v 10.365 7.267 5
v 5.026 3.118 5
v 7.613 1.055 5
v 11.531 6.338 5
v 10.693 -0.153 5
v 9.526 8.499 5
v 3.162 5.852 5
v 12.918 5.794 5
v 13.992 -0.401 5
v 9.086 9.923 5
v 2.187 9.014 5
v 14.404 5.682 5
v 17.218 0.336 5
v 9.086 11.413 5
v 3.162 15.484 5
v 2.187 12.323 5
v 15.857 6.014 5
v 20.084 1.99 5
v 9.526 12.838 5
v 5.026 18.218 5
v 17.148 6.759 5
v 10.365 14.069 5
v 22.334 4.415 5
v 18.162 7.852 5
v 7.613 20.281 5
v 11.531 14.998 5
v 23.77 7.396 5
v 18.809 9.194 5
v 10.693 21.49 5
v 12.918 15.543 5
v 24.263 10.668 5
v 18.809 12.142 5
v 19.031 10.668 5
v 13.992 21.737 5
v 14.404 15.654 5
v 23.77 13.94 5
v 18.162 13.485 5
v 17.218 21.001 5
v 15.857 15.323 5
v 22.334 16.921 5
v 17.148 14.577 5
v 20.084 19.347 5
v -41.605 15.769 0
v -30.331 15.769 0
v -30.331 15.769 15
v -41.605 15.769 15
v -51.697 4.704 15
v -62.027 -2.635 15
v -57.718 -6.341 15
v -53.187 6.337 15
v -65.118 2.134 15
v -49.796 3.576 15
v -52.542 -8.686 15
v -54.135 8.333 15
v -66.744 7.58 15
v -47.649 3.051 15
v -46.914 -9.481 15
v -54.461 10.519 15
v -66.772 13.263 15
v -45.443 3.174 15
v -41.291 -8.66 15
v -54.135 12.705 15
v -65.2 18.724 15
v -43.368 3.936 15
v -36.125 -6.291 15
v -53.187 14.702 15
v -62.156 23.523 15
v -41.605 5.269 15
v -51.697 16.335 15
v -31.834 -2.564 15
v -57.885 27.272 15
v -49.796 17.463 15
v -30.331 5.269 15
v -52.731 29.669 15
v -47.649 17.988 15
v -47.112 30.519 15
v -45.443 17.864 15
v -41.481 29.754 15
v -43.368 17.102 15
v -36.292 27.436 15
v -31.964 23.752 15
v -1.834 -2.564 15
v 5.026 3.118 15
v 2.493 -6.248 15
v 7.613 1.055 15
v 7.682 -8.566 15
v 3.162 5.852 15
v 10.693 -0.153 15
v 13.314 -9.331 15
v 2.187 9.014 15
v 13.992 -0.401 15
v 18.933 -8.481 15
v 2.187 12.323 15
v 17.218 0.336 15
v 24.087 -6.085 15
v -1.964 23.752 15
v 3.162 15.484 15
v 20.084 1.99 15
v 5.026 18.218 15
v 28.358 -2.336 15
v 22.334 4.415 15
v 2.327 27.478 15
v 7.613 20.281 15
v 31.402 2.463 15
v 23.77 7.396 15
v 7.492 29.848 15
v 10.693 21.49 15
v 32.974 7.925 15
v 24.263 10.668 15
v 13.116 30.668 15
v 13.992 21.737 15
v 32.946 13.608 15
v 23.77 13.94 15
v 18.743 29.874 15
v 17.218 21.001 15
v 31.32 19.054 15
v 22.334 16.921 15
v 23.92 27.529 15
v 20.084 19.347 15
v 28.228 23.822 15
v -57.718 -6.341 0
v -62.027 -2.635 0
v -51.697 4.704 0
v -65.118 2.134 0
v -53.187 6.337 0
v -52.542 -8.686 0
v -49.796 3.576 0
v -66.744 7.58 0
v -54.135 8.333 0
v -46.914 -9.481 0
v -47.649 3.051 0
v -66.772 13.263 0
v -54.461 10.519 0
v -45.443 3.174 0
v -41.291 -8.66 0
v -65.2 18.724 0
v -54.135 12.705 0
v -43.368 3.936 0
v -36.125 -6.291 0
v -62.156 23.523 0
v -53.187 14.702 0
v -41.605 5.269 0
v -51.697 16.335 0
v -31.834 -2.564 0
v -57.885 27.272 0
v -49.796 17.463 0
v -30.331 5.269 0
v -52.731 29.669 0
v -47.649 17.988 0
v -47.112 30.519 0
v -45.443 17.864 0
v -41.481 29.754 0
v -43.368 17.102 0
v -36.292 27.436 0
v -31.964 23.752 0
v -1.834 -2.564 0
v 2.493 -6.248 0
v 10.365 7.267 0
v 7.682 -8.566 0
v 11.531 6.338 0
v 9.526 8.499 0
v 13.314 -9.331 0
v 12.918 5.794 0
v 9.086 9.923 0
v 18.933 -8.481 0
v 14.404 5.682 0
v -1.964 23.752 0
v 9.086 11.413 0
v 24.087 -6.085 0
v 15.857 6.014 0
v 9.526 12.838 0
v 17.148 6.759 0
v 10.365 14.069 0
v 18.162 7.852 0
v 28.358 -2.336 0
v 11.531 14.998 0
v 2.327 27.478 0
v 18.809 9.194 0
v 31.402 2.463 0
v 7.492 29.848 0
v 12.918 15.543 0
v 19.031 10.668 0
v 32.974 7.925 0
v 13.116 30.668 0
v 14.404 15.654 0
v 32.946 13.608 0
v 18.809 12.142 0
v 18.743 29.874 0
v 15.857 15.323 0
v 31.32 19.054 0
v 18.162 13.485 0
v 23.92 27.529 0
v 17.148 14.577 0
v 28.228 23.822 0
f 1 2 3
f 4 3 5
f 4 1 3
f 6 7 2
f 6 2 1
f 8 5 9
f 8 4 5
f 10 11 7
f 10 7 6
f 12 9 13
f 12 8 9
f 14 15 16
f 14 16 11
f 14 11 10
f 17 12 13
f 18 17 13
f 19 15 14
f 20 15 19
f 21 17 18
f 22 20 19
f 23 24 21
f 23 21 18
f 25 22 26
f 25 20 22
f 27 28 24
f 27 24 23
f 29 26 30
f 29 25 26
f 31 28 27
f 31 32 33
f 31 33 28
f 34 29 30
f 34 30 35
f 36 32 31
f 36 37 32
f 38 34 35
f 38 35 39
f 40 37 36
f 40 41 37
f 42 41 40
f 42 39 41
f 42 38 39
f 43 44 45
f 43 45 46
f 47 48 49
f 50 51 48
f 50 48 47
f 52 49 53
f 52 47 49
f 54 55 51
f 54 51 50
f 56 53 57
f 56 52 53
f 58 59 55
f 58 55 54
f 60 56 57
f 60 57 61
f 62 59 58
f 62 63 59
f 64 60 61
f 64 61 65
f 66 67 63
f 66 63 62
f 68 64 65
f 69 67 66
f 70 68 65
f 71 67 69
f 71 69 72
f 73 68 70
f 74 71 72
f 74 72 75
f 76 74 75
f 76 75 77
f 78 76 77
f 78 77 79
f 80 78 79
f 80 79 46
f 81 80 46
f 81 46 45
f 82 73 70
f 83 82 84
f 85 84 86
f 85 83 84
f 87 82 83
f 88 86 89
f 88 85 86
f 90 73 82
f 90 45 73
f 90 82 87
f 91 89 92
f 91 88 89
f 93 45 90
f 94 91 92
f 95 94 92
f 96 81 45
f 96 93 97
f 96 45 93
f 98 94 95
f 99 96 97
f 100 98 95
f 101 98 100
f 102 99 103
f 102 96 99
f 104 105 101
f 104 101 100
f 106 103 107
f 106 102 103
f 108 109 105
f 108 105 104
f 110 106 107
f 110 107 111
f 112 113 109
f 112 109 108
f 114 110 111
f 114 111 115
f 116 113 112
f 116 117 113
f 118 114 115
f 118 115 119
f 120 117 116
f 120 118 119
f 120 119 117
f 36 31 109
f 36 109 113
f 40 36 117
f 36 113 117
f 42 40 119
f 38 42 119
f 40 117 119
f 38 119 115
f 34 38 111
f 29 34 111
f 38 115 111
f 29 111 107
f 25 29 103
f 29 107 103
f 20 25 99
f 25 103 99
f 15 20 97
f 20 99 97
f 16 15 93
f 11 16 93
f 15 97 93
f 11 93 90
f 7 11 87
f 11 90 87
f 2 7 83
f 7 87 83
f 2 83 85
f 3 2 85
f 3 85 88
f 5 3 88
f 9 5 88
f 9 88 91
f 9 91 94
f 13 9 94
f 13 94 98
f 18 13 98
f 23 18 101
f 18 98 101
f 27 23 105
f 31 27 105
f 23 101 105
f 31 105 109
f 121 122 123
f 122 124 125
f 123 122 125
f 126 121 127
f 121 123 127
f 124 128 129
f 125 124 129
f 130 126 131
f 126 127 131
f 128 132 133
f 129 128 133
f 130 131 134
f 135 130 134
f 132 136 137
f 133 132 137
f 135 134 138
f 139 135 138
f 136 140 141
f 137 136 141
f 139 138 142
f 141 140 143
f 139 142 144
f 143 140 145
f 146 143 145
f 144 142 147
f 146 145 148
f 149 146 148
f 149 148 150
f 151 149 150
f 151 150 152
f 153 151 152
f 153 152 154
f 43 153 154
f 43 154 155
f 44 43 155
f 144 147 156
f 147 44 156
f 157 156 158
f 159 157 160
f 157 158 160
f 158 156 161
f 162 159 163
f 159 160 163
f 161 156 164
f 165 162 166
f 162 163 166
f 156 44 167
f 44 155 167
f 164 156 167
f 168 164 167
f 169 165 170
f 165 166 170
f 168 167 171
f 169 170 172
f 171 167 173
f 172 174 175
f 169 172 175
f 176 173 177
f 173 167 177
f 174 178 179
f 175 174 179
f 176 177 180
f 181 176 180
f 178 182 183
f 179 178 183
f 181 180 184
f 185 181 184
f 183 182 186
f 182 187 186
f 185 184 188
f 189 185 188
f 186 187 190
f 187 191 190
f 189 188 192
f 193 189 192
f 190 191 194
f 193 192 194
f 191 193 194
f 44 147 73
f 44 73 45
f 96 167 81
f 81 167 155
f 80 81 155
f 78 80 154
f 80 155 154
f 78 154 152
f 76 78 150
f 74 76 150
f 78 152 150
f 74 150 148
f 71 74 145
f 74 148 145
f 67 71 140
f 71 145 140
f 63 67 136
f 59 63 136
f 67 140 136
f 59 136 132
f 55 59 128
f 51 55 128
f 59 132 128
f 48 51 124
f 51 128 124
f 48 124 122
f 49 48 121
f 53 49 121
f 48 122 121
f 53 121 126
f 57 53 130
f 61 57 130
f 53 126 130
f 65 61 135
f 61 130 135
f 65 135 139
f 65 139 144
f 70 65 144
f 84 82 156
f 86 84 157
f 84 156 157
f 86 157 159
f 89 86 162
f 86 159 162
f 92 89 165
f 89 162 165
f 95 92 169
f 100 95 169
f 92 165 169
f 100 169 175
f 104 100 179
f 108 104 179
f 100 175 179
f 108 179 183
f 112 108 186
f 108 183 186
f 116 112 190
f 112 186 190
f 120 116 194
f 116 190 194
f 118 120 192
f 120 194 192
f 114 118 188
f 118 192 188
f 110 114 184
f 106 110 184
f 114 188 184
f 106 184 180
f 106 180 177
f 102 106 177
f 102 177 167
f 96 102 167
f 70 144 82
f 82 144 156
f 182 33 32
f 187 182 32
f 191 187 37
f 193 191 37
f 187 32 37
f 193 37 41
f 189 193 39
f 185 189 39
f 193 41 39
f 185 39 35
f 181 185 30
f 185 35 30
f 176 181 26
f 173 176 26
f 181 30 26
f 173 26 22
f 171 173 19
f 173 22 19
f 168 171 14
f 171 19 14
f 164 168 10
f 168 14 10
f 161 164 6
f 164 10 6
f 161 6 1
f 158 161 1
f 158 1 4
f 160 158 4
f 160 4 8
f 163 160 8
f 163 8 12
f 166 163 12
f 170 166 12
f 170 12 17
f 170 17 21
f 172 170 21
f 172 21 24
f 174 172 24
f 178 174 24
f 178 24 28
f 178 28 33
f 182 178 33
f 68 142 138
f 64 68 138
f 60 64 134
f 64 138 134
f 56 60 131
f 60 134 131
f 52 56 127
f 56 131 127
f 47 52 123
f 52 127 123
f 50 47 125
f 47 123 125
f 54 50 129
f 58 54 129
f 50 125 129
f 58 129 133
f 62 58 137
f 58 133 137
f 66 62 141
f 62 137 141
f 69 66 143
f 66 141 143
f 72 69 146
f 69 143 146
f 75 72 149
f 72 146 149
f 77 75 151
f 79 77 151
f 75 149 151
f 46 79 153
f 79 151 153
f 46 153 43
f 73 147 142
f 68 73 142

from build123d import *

# Parameters (mm, degrees)
BOSS_EXTRUDE3_DEPTH = 15
SKETCH5_R           = 11.1
CUT_EXTRUDE2_DEPTH  = 10
SKETCH8_R           = 5
CUT_EXTRUDE5_DEPTH  = 10
SKETCH10_R          = 7.5
SKETCH10_W          = 12
SKETCH10_H          = 10.5
CUT_EXTRUDE6_DEPTH  = 16


with BuildPart() as part:
    # Sketch4 → Boss-Extrude3 (new body)
    with BuildSketch(Plane.XY):
        with BuildLine():
            Line((-31.83399024, -2.564162853), (-1.83399024, -2.564162853))
            ThreePointArc((-1.83399024, -2.564162853), (33.162534063, 10.767212745), (-1.964197709, 23.75162662))
            Line((-1.964197709, 23.75162662), (-31.964197709, 23.75162662))
            ThreePointArc((-31.964197709, 23.75162662), (-66.960722012, 10.420251021), (-31.83399024, -2.564162853))
        make_face()
    extrude(amount=BOSS_EXTRUDE3_DEPTH)

    # Sketch5 → Cut-Extrude2 (cut)
    with BuildSketch(Plane.XY.offset(15)):
        with Locations((13.162778875, 10.66825628)):
            Circle(SKETCH5_R)
    extrude(amount=-CUT_EXTRUDE2_DEPTH, mode=Mode.SUBTRACT)

    # Sketch8 → Cut-Extrude5 (cut)
    with BuildSketch(Plane.XY.offset(5)):
        with Locations((14.03064546, 10.66825628)):
            Circle(SKETCH8_R)
    extrude(amount=-CUT_EXTRUDE5_DEPTH, mode=Mode.SUBTRACT)

    # Sketch10 → Cut-Extrude6 (cut, through all)
    with BuildSketch(Plane(origin=(0, 0, 0), x_dir=(-1, 0, 0), z_dir=(0, 0, -1))):
        with Locations((46.960966823, 10.519207486)):
            Circle(SKETCH10_R)
        with Locations((36.330902029, 10.519207486)):
            Rectangle(SKETCH10_W, SKETCH10_H)
    extrude(amount=-CUT_EXTRUDE6_DEPTH, mode=Mode.SUBTRACT)


solid = part.part
